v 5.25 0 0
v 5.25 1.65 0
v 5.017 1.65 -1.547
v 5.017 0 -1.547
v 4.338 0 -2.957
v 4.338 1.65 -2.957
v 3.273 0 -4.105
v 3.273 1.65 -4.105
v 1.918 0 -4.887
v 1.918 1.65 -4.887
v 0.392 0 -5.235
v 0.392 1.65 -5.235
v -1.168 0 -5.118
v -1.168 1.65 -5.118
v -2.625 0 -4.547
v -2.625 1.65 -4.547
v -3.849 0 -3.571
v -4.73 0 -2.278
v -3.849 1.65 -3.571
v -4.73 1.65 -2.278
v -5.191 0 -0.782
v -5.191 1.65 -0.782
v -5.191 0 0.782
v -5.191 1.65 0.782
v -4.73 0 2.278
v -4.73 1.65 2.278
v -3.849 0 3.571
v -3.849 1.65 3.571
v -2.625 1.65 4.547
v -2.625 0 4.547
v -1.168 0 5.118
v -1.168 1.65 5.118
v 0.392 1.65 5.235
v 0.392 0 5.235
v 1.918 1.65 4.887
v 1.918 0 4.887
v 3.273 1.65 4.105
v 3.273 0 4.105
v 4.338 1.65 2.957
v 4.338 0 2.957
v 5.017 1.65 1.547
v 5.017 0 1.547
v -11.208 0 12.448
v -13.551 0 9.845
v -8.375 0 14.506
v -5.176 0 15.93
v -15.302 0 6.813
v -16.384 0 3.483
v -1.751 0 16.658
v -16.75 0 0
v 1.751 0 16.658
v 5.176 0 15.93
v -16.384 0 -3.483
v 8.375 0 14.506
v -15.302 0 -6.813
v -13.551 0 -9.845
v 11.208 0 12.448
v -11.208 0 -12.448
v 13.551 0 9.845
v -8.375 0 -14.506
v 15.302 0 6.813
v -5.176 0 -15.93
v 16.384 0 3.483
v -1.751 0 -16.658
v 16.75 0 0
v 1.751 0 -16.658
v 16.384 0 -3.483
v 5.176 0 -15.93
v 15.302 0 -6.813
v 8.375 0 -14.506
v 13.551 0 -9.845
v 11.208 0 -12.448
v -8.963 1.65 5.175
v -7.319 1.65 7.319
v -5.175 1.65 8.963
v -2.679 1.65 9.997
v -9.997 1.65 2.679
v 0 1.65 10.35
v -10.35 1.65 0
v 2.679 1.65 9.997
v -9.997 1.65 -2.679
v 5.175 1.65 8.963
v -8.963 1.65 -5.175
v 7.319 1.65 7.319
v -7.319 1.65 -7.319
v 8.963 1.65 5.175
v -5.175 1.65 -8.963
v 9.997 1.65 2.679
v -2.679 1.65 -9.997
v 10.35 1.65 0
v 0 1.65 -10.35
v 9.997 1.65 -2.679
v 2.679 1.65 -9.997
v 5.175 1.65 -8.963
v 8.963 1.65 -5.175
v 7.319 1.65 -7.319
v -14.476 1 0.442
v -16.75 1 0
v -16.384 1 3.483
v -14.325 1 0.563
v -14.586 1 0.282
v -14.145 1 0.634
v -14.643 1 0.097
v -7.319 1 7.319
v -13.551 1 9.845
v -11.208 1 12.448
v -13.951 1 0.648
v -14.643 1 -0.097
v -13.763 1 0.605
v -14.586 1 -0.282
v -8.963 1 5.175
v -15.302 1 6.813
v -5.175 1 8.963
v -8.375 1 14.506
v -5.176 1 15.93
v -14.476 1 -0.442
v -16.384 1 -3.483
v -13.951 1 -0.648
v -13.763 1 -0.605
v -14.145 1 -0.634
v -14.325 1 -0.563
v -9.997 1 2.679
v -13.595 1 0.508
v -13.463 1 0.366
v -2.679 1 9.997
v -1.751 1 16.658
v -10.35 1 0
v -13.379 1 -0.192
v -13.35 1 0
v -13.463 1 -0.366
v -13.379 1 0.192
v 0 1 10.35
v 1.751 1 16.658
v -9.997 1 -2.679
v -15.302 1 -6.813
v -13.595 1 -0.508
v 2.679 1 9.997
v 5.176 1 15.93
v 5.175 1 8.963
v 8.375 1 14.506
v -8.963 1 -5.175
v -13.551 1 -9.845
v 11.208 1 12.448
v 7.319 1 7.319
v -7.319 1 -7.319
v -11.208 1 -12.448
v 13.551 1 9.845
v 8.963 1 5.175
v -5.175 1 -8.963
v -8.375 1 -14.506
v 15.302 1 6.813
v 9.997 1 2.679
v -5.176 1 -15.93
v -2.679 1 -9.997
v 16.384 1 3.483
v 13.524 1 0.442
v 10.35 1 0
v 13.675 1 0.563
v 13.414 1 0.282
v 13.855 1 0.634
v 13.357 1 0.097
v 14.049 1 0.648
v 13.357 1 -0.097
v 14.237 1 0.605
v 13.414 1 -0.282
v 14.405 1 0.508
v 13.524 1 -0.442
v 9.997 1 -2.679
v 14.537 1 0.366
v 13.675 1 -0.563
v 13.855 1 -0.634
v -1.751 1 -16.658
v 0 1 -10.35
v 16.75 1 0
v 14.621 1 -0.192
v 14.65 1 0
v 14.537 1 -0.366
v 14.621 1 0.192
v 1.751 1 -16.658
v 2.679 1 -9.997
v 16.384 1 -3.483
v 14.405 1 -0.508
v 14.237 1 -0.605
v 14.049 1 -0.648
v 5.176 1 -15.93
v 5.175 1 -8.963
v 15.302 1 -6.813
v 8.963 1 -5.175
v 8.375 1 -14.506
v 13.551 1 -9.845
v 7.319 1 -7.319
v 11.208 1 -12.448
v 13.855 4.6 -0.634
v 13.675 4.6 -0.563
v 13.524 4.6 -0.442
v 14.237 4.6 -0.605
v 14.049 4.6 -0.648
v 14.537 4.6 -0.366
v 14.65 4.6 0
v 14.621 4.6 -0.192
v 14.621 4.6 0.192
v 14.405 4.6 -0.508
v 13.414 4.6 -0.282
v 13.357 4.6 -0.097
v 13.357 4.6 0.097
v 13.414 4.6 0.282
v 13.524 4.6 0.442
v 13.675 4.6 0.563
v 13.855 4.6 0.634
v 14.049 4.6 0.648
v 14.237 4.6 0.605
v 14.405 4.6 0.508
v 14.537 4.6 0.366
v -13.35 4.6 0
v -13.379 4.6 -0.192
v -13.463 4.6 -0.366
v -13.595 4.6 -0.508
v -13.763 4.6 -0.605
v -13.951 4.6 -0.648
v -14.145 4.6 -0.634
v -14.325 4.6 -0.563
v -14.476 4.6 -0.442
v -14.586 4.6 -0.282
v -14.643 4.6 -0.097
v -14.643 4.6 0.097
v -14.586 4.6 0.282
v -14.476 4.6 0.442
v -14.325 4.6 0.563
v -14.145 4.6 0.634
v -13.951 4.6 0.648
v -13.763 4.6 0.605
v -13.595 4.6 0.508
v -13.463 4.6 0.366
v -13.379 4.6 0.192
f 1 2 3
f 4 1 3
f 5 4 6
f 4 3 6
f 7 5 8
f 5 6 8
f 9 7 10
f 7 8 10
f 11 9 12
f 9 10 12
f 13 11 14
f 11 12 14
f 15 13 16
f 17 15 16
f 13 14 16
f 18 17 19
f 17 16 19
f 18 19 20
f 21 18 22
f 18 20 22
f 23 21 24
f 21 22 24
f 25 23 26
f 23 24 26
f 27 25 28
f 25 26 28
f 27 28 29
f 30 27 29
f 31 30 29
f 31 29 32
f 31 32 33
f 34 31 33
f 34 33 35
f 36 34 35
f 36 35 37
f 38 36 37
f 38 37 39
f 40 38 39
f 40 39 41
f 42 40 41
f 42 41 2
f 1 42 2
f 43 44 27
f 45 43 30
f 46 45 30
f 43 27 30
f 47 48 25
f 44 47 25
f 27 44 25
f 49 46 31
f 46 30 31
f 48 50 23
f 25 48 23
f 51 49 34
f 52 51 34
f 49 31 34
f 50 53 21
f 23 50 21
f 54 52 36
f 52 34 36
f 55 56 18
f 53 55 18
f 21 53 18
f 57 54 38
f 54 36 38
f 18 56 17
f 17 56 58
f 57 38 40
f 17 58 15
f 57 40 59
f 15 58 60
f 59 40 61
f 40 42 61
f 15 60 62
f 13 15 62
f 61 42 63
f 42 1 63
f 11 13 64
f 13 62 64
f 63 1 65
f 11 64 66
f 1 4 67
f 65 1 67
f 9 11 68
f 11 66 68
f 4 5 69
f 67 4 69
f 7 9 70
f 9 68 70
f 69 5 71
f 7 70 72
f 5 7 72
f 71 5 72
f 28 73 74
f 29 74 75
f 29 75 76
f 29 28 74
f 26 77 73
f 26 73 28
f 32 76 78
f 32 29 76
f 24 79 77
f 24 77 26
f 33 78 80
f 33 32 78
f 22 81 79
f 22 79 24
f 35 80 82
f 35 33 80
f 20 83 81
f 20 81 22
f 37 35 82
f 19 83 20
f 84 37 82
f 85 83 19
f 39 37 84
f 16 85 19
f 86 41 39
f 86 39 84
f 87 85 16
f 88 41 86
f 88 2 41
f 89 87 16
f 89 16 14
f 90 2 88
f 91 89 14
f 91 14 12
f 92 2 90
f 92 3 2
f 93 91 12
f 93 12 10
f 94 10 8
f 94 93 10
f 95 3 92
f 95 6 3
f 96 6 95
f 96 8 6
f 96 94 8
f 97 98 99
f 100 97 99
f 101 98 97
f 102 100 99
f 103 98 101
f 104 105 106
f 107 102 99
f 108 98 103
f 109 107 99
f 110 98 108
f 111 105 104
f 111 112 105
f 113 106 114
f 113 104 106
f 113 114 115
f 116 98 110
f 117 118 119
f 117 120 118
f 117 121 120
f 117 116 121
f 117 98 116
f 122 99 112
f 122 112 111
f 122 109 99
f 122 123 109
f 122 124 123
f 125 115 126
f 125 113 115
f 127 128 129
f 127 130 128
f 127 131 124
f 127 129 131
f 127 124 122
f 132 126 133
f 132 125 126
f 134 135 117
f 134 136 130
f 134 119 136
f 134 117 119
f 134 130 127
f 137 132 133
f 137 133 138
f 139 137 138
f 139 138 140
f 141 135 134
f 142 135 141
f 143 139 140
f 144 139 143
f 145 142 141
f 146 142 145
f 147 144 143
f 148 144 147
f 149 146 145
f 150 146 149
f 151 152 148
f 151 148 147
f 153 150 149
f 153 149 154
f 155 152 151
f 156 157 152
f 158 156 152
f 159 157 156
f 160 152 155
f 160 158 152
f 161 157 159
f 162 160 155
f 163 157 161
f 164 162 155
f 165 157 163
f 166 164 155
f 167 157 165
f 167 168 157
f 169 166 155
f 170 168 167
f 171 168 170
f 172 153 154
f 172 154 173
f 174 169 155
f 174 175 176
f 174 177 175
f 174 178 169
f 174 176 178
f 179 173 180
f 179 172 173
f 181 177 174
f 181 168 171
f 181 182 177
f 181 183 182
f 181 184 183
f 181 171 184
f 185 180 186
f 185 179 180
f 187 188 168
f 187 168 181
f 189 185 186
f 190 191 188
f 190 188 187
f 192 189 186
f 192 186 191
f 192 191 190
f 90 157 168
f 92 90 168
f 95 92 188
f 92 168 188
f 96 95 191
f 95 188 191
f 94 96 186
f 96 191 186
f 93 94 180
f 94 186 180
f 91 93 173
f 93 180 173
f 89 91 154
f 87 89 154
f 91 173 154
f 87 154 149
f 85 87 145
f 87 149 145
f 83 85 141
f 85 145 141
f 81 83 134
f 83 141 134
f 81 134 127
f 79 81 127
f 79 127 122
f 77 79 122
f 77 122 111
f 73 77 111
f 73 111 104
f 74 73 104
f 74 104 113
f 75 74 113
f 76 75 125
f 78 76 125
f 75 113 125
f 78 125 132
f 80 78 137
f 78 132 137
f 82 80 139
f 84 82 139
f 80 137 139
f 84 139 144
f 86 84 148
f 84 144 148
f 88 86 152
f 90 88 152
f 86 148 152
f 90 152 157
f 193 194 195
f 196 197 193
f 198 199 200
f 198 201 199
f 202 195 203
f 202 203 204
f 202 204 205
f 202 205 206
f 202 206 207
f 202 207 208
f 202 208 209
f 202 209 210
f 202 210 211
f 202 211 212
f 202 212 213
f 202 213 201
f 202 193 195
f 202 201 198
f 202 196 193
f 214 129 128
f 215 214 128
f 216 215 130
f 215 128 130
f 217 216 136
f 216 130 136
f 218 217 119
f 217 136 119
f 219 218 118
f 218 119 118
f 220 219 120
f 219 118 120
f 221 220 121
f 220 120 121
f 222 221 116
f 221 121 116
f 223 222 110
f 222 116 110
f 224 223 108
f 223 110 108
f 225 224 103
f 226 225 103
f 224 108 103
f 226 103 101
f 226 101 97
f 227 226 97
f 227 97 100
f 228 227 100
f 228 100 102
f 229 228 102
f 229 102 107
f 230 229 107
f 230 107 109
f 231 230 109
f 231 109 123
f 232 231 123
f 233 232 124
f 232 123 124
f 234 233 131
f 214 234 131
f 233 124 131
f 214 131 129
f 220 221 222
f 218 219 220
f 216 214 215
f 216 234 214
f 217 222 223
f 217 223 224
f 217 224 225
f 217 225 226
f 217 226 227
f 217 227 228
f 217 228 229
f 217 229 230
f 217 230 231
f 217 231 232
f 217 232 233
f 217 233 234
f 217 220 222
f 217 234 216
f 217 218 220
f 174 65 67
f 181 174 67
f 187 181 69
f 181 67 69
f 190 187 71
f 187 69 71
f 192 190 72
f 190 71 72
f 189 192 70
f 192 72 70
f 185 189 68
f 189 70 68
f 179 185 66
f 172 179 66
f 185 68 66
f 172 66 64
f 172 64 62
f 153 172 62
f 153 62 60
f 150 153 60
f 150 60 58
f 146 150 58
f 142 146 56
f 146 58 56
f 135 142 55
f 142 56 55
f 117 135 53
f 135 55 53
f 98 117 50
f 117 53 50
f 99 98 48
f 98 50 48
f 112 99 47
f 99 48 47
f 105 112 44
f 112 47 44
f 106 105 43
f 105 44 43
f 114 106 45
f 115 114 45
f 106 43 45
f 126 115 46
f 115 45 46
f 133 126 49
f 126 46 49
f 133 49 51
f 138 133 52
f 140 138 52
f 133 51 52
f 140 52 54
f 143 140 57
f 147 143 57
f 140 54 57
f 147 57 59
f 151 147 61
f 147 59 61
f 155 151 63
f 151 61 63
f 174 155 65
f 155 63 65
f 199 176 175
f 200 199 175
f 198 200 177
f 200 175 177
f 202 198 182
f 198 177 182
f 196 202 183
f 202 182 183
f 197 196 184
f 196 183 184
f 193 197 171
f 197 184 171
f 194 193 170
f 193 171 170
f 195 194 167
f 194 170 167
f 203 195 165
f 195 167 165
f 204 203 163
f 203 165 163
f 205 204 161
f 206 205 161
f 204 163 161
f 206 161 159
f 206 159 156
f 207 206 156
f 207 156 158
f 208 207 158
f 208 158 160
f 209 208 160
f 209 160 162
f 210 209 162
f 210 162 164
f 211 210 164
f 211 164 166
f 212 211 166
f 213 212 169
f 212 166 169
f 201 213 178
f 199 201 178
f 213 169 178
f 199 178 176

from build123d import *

# Parameters (mm, degrees)
SKETCH_1_R          = 16.75
EXTRUDE_1_DEPTH     = 1
SKETCH_2_R          = 10.35
EXTRUDE_2_DEPTH     = 0.65
SKETCH_3_R          = 5.25
CUT_EXTRUDE_1_DEPTH = 2.65
SKETCH_4_R          = 0.6499985
EXTRUDE_3_DEPTH     = 3.6


with BuildPart() as part:
    # Эскиз1 → Бобышка-Вытянуть1 (new body)
    with BuildSketch(Plane(origin=(0, 0, 0), x_dir=(1, 0, 0), z_dir=(0, 1, 0))):
        Circle(SKETCH_1_R)
    extrude(amount=EXTRUDE_1_DEPTH)

    # Эскиз2 → Бобышка-Вытянуть2 (add)
    with BuildSketch(Plane(origin=(0, 1, 0), x_dir=(1, 0, 0), z_dir=(0, 1, 0))):
        Circle(SKETCH_2_R)
    extrude(amount=EXTRUDE_2_DEPTH)

    # Эскиз3 → Вырез-Вытянуть1 (cut, through all)
    with BuildSketch(Plane(origin=(0, 1.65, 0), x_dir=(1, 0, 0), z_dir=(0, 1, 0))):
        Circle(SKETCH_3_R)
    extrude(amount=-CUT_EXTRUDE_1_DEPTH, mode=Mode.SUBTRACT)

    # Эскиз4 → Бобышка-Вытянуть3 (add)
    with BuildSketch(Plane(origin=(0, 1, 0), x_dir=(1, 0, 0), z_dir=(0, 1, 0))):
        with Locations((14.0000228, 0)):
            Circle(SKETCH_4_R)
        with Locations((-13.999972, 0)):
            Circle(SKETCH_4_R)
    extrude(amount=EXTRUDE_3_DEPTH)


solid = part.part
